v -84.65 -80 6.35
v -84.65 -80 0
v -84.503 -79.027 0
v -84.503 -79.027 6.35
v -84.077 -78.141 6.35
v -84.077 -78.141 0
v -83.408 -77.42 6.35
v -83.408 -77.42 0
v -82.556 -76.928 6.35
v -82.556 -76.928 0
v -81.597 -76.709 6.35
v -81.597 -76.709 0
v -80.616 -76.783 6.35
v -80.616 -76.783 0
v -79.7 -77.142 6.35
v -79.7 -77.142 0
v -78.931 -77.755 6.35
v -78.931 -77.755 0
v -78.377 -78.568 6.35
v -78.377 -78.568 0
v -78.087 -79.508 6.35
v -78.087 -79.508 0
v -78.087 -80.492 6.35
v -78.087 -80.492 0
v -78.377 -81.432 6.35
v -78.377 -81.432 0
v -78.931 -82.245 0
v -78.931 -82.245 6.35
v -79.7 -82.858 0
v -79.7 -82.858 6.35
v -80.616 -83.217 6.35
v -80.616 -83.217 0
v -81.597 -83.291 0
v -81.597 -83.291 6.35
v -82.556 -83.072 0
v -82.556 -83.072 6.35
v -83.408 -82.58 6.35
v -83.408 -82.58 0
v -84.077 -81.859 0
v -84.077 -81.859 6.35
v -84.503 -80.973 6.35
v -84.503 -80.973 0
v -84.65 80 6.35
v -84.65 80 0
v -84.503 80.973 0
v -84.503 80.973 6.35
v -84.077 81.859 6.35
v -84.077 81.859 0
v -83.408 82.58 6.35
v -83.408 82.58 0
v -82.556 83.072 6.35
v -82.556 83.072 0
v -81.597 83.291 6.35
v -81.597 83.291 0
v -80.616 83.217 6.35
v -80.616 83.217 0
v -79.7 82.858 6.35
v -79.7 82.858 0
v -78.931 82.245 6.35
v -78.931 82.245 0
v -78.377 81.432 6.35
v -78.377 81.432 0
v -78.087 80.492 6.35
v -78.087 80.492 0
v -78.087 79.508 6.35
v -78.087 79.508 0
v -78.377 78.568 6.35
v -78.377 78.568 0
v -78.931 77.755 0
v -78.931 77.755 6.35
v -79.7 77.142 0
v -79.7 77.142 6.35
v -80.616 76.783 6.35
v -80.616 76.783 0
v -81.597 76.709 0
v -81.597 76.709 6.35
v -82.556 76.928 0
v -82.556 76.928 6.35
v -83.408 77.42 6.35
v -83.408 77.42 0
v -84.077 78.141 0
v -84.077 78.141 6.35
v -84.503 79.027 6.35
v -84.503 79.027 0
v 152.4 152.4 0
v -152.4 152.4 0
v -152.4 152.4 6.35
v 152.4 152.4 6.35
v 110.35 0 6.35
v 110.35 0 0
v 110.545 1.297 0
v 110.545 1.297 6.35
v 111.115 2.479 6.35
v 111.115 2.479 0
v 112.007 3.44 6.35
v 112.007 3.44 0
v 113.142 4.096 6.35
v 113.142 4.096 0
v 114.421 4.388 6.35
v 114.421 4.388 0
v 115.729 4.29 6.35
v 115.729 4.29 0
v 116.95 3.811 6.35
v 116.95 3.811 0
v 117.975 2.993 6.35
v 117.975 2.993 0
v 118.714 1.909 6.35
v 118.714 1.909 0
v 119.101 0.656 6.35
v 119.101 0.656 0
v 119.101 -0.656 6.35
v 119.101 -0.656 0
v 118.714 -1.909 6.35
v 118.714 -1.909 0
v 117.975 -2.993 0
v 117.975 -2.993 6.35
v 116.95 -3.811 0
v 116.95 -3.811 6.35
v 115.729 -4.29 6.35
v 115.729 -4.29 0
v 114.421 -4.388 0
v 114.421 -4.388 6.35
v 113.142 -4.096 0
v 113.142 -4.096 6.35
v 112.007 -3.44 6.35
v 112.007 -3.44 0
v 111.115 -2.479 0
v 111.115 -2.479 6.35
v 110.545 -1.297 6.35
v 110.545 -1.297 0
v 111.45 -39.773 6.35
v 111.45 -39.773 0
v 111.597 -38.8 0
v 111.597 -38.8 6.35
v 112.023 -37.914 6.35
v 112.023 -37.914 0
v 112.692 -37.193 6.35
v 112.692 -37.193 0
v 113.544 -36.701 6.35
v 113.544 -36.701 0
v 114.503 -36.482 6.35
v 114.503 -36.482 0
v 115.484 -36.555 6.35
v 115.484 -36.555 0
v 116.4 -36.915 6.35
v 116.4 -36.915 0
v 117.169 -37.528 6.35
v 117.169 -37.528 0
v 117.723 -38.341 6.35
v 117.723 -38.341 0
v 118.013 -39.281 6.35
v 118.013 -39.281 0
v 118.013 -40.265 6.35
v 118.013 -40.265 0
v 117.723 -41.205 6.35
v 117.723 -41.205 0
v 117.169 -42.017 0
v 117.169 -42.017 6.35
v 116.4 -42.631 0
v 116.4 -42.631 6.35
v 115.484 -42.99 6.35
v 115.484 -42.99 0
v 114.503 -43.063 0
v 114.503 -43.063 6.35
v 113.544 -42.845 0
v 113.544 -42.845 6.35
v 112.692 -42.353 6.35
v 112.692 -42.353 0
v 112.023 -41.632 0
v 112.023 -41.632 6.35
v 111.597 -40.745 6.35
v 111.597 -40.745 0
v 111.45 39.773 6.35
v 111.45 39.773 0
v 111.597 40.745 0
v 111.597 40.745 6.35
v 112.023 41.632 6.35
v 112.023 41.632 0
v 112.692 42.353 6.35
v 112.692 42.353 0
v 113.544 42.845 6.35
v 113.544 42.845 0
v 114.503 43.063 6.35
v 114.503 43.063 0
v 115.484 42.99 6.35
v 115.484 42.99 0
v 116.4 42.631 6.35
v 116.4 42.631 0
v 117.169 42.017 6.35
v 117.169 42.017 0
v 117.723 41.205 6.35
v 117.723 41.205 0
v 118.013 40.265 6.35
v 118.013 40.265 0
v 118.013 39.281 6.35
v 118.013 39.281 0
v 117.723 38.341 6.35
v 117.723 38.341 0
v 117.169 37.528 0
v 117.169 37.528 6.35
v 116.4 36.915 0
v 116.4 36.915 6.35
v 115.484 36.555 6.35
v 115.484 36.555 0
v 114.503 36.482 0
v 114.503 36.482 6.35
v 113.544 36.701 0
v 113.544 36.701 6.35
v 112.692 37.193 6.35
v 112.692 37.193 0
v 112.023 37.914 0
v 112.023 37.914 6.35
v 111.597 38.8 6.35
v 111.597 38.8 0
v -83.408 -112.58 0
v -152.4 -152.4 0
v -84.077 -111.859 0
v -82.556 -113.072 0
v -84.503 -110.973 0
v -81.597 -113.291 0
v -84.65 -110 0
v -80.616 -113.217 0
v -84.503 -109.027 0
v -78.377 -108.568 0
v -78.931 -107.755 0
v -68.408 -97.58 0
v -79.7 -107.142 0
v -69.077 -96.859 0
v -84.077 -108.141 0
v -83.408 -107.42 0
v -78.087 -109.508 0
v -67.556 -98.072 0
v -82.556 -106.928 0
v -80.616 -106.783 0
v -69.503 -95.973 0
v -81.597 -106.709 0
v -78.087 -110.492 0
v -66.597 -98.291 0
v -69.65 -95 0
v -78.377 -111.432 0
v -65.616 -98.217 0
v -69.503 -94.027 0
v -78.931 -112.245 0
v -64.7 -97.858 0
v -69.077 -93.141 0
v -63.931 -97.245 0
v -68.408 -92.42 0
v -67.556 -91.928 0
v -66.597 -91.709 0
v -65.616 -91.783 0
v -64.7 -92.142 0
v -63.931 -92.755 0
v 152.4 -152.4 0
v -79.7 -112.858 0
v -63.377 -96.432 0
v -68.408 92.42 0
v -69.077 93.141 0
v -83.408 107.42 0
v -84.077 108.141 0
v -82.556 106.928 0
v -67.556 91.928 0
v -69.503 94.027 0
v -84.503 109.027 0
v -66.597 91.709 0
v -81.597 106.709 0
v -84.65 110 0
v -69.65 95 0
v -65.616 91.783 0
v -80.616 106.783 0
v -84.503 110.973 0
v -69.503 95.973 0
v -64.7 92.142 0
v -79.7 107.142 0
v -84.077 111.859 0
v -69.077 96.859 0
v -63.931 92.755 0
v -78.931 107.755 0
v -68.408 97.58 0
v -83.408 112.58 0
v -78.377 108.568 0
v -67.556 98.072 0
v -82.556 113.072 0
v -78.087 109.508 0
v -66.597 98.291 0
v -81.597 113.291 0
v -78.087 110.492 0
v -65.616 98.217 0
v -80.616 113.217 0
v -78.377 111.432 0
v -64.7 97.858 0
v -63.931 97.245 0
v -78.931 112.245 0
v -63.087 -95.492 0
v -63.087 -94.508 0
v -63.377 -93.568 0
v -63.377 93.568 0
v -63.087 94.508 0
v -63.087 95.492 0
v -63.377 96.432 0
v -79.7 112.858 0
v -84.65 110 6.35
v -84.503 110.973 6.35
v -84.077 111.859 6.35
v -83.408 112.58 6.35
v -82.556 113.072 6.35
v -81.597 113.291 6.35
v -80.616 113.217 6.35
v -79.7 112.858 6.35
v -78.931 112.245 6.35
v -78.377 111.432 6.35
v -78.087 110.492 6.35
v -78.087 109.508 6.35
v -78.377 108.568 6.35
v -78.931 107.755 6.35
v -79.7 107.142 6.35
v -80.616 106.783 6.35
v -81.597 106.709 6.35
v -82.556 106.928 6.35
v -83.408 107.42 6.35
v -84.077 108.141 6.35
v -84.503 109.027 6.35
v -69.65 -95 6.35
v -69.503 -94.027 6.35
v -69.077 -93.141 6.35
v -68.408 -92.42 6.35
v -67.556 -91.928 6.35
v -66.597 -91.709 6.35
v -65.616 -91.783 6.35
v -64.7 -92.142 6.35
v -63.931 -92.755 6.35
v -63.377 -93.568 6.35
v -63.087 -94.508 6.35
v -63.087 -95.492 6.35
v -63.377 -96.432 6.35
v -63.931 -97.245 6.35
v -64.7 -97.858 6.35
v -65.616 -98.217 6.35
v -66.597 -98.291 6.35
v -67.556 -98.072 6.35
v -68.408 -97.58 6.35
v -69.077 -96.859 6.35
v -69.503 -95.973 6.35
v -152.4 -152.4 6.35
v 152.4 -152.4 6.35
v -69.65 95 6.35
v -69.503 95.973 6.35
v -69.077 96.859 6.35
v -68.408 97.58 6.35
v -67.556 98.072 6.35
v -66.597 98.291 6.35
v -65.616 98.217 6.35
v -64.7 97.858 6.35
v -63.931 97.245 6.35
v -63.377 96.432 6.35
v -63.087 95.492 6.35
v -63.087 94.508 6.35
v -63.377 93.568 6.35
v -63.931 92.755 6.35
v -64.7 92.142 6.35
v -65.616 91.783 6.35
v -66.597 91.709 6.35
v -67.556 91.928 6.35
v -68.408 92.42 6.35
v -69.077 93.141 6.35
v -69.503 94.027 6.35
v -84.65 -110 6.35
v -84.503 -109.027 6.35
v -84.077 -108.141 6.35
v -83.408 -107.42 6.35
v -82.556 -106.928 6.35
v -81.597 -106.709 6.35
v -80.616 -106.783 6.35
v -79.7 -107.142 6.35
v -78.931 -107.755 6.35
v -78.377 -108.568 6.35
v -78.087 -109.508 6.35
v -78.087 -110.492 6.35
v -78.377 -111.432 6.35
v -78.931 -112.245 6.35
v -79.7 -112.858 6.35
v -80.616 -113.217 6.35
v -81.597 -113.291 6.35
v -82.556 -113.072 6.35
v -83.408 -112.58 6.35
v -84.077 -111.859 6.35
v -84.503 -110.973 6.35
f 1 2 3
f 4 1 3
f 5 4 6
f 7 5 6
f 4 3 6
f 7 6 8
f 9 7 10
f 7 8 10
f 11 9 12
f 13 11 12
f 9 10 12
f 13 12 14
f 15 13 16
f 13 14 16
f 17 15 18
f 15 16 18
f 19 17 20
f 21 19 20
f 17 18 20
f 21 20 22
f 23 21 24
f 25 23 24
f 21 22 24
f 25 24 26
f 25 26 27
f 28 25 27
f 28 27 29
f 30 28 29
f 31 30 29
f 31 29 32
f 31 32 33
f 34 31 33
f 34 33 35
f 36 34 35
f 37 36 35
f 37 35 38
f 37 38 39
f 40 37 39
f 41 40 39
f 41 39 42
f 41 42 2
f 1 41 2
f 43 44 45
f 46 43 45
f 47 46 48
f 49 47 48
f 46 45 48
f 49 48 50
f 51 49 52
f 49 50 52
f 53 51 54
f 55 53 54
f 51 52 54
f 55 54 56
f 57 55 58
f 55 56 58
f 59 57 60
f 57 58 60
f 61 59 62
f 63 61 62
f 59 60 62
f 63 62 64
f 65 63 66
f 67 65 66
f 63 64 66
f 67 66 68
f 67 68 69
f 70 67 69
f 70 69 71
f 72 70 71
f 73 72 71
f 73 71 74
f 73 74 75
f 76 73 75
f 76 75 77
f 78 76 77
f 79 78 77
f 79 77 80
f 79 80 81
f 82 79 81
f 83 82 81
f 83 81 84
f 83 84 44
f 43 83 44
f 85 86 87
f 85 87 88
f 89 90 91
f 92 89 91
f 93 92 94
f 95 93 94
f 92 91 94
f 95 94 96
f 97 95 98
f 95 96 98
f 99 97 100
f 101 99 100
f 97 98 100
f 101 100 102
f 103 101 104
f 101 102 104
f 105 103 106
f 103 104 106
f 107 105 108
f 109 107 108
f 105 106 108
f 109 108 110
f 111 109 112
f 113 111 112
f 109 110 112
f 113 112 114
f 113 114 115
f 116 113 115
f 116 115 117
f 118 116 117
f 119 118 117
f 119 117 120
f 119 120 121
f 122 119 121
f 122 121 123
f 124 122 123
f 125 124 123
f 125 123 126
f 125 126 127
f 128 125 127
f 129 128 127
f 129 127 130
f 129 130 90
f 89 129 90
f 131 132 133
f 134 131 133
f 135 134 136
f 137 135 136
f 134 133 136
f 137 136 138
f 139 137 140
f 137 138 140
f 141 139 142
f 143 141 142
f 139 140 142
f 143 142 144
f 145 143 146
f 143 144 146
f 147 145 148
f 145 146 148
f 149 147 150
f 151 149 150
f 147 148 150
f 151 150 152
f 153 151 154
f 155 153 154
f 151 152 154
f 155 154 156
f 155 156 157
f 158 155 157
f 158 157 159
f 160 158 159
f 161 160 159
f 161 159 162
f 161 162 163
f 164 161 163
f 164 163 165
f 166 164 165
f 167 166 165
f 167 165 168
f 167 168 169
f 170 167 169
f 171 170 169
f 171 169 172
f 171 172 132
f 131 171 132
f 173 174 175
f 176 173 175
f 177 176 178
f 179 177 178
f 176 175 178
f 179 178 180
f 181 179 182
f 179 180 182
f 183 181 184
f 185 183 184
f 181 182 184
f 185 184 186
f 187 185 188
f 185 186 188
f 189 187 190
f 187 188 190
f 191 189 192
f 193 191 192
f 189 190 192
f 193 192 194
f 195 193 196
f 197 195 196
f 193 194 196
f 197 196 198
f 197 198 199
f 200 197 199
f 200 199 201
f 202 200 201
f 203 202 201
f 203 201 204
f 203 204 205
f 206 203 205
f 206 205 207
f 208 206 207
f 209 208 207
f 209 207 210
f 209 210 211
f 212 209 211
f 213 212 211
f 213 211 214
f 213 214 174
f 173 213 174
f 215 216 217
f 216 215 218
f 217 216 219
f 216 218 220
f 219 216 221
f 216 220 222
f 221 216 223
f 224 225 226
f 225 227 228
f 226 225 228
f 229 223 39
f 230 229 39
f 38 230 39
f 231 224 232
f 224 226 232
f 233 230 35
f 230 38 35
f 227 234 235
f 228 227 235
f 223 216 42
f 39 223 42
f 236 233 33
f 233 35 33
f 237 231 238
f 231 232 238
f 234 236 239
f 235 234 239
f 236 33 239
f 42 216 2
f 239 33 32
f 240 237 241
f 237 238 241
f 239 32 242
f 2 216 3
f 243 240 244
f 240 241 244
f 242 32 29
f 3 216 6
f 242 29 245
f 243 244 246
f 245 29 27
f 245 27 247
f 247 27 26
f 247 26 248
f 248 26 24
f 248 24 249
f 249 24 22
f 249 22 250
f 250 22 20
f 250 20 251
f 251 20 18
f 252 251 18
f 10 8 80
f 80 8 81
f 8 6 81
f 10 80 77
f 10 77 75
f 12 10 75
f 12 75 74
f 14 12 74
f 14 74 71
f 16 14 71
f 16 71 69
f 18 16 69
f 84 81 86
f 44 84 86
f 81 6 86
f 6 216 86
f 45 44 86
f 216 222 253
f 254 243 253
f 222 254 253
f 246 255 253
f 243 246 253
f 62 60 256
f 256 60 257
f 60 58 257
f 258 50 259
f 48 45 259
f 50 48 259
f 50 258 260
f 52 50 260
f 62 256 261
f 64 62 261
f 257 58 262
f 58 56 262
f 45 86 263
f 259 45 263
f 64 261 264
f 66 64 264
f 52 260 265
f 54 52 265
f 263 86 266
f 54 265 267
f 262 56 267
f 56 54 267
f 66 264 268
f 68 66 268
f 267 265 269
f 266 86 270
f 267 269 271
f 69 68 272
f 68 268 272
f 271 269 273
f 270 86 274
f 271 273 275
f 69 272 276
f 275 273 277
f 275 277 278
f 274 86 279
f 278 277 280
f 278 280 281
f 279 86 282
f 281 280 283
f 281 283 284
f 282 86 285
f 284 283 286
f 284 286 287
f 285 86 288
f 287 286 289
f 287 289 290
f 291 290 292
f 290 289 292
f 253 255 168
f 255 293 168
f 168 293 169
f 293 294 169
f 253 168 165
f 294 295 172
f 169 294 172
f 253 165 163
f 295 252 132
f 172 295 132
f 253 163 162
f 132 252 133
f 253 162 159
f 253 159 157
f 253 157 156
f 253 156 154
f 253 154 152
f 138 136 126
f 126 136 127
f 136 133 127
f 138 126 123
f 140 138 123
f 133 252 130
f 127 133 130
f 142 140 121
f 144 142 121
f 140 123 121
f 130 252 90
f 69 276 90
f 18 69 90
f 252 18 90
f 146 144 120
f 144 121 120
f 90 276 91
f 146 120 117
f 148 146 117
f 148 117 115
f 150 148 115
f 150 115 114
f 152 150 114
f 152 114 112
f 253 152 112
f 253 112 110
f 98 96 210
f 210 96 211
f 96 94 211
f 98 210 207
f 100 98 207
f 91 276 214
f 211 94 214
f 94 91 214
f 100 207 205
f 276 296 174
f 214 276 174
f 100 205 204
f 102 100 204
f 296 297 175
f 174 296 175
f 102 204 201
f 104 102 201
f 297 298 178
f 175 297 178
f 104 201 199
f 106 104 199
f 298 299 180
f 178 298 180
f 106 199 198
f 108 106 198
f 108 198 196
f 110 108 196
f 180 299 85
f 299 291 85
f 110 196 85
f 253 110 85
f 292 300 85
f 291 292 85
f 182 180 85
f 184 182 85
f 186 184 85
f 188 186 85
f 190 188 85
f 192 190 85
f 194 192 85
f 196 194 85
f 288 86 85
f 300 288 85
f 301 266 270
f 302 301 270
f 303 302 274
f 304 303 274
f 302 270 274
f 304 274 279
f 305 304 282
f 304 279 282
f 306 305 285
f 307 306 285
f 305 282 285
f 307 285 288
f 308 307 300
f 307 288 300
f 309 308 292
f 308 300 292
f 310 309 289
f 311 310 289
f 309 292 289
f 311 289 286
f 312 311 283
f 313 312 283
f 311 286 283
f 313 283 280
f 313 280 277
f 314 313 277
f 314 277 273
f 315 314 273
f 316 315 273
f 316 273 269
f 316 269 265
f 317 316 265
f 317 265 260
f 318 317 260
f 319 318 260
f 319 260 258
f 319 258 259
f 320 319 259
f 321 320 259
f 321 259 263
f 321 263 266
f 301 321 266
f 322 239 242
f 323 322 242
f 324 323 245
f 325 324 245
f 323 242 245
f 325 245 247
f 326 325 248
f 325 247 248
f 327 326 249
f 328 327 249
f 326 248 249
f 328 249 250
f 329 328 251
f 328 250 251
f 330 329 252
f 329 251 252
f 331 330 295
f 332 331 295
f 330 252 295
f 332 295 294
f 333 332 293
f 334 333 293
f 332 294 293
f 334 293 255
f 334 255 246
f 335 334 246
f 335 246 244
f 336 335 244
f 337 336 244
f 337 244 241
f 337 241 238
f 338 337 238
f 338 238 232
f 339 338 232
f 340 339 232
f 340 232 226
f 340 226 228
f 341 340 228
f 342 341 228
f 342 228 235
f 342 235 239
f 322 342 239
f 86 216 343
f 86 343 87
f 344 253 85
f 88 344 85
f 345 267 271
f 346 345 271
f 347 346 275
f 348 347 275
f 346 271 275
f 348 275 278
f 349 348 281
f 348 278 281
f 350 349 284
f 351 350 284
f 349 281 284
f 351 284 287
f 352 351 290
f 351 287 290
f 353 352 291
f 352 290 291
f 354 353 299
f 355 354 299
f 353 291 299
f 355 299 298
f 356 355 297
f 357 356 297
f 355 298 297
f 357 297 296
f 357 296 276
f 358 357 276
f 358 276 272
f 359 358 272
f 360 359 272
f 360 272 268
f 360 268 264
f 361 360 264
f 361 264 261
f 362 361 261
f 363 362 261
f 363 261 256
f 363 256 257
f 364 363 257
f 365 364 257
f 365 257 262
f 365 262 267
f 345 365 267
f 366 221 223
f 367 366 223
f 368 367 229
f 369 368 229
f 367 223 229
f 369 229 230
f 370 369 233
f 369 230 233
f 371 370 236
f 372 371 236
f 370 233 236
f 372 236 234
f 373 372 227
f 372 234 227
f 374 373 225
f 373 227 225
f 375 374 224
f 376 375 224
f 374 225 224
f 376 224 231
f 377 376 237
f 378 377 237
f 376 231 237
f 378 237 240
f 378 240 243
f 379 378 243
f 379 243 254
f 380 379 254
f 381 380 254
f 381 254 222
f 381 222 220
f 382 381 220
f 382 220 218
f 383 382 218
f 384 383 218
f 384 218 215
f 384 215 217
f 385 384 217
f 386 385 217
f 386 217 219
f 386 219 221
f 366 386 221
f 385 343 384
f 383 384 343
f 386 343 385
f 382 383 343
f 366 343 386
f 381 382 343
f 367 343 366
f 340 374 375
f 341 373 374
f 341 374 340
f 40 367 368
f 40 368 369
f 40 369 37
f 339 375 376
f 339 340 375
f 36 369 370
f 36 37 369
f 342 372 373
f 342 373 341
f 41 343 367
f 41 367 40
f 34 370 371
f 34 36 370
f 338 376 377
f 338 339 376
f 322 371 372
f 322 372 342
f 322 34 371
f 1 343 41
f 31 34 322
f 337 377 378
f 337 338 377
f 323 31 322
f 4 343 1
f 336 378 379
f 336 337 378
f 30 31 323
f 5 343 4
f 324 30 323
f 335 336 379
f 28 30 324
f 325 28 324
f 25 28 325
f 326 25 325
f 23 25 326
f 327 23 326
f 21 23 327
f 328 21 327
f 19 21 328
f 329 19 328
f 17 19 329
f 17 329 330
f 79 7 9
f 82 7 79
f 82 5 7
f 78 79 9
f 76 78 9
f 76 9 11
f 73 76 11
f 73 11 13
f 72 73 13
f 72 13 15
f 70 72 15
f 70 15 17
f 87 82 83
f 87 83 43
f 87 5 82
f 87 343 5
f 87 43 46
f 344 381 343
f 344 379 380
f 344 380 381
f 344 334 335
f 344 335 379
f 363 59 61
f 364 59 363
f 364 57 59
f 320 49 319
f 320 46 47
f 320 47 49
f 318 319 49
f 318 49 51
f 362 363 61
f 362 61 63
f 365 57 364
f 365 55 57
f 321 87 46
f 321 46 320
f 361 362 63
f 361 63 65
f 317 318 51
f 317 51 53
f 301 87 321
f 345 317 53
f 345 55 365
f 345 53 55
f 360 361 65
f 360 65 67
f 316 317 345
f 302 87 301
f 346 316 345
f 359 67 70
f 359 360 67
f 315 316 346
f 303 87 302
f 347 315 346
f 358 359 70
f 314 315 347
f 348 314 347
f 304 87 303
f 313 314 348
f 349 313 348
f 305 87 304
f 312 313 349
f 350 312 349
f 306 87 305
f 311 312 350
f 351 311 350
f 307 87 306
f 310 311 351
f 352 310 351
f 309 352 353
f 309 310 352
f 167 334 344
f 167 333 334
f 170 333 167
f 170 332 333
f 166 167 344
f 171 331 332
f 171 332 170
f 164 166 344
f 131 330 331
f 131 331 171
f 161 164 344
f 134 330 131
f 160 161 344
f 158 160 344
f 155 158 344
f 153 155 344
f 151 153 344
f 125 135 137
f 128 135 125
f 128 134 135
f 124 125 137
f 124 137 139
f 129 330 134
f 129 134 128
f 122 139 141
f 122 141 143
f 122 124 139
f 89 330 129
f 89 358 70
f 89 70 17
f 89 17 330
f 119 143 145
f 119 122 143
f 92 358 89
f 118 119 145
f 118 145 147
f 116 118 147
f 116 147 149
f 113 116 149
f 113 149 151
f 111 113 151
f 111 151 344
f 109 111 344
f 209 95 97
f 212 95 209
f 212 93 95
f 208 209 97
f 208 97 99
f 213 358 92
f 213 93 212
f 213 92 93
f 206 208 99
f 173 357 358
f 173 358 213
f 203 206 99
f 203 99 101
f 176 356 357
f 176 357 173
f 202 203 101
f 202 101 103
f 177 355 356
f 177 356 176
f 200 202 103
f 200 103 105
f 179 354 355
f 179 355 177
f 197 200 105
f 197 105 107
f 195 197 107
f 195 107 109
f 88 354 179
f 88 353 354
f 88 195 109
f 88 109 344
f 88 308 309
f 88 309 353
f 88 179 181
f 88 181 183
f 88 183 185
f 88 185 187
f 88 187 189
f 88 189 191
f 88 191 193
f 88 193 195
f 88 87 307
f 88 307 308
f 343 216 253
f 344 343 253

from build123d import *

# Parameters (mm, degrees)
F0_W     = 304.8
F0_H     = 304.8
F1_DEPTH = 6.35
F3_D     = 6.6
F4_D     = 8.8


with BuildPart() as f1:
    # F0 (on Top) → F1 (new body)
    with BuildSketch(Plane.XY):
        Rectangle(F0_W, F0_H)
    extrude(amount=F1_DEPTH)

    # F3 (through all)
    with Locations(Plane.XY.offset(6.35)):
        with Locations((-81.35, -110), (-66.35, -95), (-81.35, -80), (-81.35, 80), (-66.35, 95), (-81.35, 110), (114.75, 39.7726856172), (114.75, -39.7726856172)):
            Hole(F3_D / 2)

    # F4 (through all)
    with Locations(Plane.XY.offset(6.35)):
        with Locations((114.75, 0)):
            Hole(F4_D / 2)


solid = f1.part
